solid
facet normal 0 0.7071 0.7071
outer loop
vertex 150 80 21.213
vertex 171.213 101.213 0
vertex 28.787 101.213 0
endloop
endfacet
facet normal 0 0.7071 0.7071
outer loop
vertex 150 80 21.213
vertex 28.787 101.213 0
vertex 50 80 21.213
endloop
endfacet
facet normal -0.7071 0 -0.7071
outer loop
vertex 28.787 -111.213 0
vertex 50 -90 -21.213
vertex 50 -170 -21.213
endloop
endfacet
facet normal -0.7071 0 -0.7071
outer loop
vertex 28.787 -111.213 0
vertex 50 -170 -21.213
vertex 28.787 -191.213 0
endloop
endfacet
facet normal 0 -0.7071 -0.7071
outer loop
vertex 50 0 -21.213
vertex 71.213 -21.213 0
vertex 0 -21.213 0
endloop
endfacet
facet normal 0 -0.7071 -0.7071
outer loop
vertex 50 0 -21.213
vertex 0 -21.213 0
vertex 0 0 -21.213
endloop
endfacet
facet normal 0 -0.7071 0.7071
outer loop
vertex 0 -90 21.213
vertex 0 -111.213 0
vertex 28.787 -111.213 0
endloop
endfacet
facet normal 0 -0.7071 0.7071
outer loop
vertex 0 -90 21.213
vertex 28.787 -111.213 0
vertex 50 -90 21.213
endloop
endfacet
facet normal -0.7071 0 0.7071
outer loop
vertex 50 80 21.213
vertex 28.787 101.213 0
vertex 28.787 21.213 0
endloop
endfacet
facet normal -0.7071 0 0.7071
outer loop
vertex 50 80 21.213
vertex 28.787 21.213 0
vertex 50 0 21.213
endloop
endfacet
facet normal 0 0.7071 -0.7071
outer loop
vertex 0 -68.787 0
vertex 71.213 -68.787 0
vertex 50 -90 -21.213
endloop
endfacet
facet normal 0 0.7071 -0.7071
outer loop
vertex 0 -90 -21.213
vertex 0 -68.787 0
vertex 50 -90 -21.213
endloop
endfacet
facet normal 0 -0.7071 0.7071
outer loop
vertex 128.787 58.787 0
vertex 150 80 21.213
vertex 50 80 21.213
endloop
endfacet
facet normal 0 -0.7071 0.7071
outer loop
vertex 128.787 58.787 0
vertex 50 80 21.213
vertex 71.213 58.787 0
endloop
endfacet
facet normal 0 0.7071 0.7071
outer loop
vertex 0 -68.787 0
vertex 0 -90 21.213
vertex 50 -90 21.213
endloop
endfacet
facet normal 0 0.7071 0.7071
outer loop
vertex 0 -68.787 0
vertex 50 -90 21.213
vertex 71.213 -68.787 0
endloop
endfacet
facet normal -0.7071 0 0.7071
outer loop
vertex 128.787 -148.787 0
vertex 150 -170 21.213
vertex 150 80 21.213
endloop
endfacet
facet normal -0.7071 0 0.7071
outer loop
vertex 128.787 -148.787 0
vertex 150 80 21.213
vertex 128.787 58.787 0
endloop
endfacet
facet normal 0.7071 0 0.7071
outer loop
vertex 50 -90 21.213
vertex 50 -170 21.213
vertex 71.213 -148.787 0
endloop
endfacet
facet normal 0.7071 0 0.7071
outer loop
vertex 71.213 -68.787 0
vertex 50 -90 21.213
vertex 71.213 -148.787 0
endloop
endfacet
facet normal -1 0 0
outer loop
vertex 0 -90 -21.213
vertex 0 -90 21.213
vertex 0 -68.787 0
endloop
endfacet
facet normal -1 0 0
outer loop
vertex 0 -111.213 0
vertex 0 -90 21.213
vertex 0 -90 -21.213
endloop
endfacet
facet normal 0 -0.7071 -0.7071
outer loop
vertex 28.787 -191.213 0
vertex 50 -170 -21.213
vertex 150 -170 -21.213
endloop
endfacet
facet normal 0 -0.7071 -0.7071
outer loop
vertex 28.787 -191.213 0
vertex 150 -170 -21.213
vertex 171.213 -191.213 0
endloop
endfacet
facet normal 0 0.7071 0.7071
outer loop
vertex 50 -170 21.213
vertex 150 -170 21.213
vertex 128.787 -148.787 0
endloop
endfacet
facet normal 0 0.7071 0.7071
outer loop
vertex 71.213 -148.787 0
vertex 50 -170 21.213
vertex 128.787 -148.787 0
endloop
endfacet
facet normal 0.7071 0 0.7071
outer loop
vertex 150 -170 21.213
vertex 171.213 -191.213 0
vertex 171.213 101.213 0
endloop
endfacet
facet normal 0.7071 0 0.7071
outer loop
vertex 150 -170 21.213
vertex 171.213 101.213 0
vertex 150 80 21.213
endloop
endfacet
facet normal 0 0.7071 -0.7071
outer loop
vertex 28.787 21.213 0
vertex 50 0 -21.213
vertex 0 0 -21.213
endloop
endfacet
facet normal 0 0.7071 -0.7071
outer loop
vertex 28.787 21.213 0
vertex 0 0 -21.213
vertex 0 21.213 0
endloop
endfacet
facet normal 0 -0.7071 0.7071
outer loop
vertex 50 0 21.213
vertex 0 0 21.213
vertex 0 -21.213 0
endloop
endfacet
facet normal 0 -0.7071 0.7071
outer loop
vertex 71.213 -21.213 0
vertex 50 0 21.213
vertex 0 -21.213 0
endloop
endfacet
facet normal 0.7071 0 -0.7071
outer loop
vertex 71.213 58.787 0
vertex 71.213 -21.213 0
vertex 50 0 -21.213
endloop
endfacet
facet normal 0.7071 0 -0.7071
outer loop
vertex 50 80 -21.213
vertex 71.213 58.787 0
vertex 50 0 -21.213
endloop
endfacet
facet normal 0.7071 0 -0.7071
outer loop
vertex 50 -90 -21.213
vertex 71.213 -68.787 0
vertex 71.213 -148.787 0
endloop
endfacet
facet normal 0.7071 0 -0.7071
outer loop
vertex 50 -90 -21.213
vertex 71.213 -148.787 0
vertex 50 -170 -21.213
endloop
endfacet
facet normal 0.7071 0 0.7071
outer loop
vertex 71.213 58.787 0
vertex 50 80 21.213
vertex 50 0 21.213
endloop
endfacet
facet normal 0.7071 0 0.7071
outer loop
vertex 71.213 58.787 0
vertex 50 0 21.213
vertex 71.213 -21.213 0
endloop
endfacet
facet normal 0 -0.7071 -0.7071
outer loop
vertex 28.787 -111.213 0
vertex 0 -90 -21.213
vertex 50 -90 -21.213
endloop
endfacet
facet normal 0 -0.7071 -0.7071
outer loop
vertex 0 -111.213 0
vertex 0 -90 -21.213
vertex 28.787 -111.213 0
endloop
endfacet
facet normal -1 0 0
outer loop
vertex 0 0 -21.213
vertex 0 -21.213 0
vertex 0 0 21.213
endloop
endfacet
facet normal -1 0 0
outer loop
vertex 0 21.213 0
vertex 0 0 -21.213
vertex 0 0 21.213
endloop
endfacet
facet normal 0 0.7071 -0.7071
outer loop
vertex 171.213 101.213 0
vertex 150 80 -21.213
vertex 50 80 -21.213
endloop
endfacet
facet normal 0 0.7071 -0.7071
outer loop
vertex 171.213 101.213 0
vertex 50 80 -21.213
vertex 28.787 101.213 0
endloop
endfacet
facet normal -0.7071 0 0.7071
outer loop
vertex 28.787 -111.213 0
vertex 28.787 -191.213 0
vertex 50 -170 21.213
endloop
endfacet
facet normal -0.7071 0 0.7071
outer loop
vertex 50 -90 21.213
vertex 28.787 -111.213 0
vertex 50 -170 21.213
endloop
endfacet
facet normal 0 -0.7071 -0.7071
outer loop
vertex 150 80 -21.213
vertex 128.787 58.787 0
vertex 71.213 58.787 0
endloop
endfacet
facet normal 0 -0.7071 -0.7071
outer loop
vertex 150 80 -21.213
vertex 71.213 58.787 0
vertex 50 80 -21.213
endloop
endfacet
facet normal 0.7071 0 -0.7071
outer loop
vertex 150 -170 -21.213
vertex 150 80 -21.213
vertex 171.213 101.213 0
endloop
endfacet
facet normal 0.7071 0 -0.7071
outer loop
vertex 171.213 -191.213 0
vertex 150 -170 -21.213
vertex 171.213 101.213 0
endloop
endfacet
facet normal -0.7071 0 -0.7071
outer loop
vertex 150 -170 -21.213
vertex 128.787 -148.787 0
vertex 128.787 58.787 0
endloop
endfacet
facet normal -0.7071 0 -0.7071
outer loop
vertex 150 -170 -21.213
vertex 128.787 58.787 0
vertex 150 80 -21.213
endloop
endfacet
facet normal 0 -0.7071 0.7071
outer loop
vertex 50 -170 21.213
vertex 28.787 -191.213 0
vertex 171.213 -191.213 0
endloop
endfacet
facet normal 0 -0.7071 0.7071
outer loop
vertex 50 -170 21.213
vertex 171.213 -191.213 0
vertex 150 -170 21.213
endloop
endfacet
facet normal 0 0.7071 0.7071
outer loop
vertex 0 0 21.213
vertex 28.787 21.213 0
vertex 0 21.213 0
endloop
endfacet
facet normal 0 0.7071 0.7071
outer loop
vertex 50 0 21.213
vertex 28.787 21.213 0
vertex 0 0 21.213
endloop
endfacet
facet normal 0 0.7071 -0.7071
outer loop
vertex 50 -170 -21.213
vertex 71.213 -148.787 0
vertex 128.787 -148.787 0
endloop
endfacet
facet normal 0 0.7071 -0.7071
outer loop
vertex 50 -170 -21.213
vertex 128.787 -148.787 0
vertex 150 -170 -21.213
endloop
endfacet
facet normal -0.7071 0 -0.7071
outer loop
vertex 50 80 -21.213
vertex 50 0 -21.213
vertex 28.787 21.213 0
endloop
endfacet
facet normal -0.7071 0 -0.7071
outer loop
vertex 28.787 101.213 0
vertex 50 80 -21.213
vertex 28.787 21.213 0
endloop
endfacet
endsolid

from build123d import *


with BuildPart() as part:
    # 스윕1: sweep along a path in 스케치2
    with BuildLine(Plane.XY) as sweep_1_path:
        Line((0, 0), (50, 0))
        Line((50, 0), (50, 80))
        Line((50, 80), (150, 80))
        Line((150, 80), (150, -170))
        Line((150, -170), (50, -170))
        Line((50, -170), (50, -90))
        Line((50, -90), (0, -90))
    # 스케치3 → 스윕1 (sweep)
    with BuildSketch(Plane(origin=(0, 0, 0), x_dir=(0, 0, -1), z_dir=(1, 0, 0))):
        Polygon((21.213203436, 0), (0, -21.213203436), (-21.213203436, 0), (0, 21.213203436), align=None)
    sweep(path=sweep_1_path.line, transition=Transition.RIGHT)


solid = part.part
